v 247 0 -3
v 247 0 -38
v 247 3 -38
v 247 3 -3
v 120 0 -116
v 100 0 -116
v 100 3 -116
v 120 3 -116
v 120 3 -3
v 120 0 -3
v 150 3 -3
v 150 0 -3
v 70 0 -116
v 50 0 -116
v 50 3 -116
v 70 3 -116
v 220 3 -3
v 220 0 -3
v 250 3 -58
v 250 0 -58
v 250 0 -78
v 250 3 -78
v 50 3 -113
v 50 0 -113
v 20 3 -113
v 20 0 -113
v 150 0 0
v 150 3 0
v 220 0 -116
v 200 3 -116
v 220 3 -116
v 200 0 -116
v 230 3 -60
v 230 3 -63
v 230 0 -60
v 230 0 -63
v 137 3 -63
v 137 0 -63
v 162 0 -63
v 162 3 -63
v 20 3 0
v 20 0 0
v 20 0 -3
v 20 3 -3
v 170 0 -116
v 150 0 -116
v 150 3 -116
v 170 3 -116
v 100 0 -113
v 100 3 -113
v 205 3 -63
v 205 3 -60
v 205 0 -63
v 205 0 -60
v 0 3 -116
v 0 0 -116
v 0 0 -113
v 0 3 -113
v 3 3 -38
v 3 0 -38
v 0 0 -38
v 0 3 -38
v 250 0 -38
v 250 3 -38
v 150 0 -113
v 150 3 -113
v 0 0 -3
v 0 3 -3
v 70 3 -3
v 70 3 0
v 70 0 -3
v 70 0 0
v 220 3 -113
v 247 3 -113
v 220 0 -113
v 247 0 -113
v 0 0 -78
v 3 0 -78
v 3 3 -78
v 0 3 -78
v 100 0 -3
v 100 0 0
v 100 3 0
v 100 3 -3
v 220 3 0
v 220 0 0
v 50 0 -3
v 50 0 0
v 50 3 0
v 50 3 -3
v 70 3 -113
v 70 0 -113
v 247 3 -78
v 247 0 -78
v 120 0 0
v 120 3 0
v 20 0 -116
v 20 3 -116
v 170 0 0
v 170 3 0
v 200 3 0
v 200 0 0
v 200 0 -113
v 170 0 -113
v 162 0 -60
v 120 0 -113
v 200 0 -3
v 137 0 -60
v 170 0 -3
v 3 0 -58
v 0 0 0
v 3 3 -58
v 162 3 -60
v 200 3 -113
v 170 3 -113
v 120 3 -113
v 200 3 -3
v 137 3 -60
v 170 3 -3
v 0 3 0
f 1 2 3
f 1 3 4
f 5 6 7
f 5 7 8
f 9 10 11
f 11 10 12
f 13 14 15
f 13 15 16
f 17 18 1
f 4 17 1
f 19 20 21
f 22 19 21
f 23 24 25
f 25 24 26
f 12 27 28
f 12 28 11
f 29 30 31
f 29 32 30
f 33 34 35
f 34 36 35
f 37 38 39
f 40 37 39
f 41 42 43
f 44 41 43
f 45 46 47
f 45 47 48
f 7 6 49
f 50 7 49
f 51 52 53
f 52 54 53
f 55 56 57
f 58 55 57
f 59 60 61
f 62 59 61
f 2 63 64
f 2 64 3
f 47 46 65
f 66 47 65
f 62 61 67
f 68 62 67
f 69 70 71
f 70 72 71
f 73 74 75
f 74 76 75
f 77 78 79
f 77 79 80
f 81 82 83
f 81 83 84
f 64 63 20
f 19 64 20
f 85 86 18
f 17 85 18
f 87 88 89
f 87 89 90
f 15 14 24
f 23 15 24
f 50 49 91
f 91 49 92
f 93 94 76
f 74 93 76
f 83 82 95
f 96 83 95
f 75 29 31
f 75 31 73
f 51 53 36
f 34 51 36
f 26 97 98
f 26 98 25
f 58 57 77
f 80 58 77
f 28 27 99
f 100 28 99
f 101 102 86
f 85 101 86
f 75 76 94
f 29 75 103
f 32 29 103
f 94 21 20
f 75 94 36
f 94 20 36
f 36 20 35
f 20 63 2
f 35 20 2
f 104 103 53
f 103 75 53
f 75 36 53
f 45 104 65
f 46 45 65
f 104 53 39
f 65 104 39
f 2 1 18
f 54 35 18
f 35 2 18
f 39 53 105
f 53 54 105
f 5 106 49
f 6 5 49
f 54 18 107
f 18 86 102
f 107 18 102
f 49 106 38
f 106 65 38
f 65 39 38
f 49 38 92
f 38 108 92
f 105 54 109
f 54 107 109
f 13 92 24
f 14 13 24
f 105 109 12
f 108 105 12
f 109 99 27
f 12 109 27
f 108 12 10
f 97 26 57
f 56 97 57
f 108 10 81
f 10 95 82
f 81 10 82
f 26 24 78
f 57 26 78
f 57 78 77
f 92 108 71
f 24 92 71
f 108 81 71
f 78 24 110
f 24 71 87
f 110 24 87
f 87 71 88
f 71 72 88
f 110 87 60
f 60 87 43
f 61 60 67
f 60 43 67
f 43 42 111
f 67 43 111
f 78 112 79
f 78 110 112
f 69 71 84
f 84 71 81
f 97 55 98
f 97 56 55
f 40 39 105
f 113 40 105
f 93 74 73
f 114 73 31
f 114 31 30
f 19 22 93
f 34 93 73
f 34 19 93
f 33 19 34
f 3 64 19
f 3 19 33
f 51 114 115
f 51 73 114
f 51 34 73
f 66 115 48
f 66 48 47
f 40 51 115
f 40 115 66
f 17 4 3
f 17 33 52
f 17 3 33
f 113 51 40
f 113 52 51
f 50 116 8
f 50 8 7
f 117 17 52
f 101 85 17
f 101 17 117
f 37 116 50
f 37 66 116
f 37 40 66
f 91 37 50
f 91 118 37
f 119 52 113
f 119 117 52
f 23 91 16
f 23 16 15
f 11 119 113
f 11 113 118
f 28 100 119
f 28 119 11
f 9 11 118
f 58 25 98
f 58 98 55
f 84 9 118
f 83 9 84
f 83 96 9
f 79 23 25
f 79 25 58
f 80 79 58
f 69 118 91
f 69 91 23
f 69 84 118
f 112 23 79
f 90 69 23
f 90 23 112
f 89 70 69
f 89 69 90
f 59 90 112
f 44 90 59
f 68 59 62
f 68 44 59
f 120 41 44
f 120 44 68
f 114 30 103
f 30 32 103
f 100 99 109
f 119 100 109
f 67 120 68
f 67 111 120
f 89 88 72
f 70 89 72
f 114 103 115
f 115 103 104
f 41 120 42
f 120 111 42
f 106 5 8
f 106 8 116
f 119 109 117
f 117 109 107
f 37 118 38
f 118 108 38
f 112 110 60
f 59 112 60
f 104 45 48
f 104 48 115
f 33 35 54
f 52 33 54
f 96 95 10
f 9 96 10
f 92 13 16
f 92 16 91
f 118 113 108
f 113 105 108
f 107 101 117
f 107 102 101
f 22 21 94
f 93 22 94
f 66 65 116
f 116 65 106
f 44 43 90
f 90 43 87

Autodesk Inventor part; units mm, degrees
ref_plane "YZ Plane" through (0, 0, 0) normal (1, 0, 0) x (0, 1, 0)
ref_plane "XZ Plane" through (0, 0, 0) normal (0, 1, 0) x (-1, 0, 0)
ref_plane "XY Plane" through (0, 0, 0) normal (0, 0, 1) x (1, 0, 0)
sketch "Sketch1" plane through (0, 0, 0) normal (0, 1, 0) x (-1, 0, 0)
  line L0 (0, 0) -> (0, -3)
  line L1 (-250, -38) -> (-250, -78)
  line L2 (0, 0) -> (-20, 0)
  line L3 (-50, 0) -> (-50, -3)
  line L4 (-50, 0) -> (-70, 0)
  line L5 (-70, 0) -> (-70, -3)
  line L6 (-100, 0) -> (-100, -3)
  line L7 (-100, 0) -> (-120, 0)
  line L8 (-120, 0) -> (-120, -3)
  line L9 (-150, 0) -> (-150, -3)
  line L10 (-150, 0) -> (-170, 0)
  line L11 (-170, 0) -> (-170, -3)
  line L12 (-200, 0) -> (-200, -3)
  line L13 (-200, 0) -> (-220, 0)
  line L14 (-220, 0) -> (-220, -3)
  line L15 (-20, 0) -> (-20, -3)
  line L16 (-250, -58) -> (-250, -78)
  line L17 (-250, -78) -> (-247, -78)
  line L18 (-247, -78) -> (-247, -113)
  line L19 (-250, -58) -> (-250, -38)
  line L20 (-250, -38) -> (-247, -38)
  line L21 (-247, -38) -> (-247, -3)
  line L22 (-220, -3) -> (-247, -3)
  line L23 (-170, -3) -> (-200, -3)
  line L24 (-120, -3) -> (-150, -3)
  line L25 (-20, -3) -> (-50, -3)
  line L26 (-70, -3) -> (-100, -3)
  line L27 (0, -116) -> (0, -113)
  line L28 (0, -116) -> (-20, -116)
  line L29 (-50, -116) -> (-50, -113)
  line L30 (-50, -116) -> (-70, -116)
  line L31 (-70, -116) -> (-70, -113)
  line L32 (-100, -116) -> (-100, -113)
  line L33 (-100, -116) -> (-120, -116)
  line L34 (-120, -116) -> (-120, -113)
  line L35 (-150, -116) -> (-150, -113)
  line L36 (-150, -116) -> (-170, -116)
  line L37 (-170, -116) -> (-170, -113)
  line L38 (-200, -116) -> (-200, -113)
  line L39 (-200, -116) -> (-220, -116)
  line L40 (-220, -116) -> (-220, -113)
  line L41 (-20, -116) -> (-20, -113)
  line L42 (-3, -58) -> (-3, -78)
  line L43 (-3, -78) -> (0, -78)
  line L44 (-3, -58) -> (-3, -38)
  line L45 (-3, -38) -> (0, -38)
  line L46 (0, -113) -> (0, -78)
  line L47 (0, -38) -> (0, -3)
  line L48 (-50, -113) -> (-20, -113)
  line L49 (-100, -113) -> (-70, -113)
  line L50 (-150, -113) -> (-120, -113)
  line L51 (-247, -113) -> (-220, -113)
  line L52 (-200, -113) -> (-170, -113)
  line L53 (-230, -60) -> (-205, -60)
  line L54 (-205, -60) -> (-205, -63)
  line L55 (-205, -63) -> (-230, -63)
  line L56 (-230, -63) -> (-230, -60)
  line L57 (-162, -60) -> (-137, -60)
  line L58 (-137, -60) -> (-137, -63)
  line L59 (-137, -63) -> (-162, -63)
  line L60 (-162, -63) -> (-162, -60)
  dimension "d2" = 110
  dimension "d3" = 20
  dimension "d4" = 20
  dimension "d5" = 20
  dimension "d7" = 20
  dimension "d8" = 20
  dimension "d9" = 20
  dimension "d10" = 3
  dimension "d11" = 20
  dimension "d12" = 3
  dimension "d13" = 250
  dimension "d14" = 30
  dimension "d15" = 30
  dimension "d16" = 30
  dimension "d17" = 30
  dimension "d23" = 25
  dimension "d24" = 3
  dimension "d25" = 43
  dimension "d26" = 25
  dimension "d27" = 3
  dimension "d28" = 57
  dimension "d31" = 17
  dimension "d32" = 2
  dimension "d33" = 3
  dimension "d34" = 40
  dimension "d35" = 110
extrude "Extrusion2" add sketch "Sketch1" along normal blind 3
properties part number "latOpSupp"
